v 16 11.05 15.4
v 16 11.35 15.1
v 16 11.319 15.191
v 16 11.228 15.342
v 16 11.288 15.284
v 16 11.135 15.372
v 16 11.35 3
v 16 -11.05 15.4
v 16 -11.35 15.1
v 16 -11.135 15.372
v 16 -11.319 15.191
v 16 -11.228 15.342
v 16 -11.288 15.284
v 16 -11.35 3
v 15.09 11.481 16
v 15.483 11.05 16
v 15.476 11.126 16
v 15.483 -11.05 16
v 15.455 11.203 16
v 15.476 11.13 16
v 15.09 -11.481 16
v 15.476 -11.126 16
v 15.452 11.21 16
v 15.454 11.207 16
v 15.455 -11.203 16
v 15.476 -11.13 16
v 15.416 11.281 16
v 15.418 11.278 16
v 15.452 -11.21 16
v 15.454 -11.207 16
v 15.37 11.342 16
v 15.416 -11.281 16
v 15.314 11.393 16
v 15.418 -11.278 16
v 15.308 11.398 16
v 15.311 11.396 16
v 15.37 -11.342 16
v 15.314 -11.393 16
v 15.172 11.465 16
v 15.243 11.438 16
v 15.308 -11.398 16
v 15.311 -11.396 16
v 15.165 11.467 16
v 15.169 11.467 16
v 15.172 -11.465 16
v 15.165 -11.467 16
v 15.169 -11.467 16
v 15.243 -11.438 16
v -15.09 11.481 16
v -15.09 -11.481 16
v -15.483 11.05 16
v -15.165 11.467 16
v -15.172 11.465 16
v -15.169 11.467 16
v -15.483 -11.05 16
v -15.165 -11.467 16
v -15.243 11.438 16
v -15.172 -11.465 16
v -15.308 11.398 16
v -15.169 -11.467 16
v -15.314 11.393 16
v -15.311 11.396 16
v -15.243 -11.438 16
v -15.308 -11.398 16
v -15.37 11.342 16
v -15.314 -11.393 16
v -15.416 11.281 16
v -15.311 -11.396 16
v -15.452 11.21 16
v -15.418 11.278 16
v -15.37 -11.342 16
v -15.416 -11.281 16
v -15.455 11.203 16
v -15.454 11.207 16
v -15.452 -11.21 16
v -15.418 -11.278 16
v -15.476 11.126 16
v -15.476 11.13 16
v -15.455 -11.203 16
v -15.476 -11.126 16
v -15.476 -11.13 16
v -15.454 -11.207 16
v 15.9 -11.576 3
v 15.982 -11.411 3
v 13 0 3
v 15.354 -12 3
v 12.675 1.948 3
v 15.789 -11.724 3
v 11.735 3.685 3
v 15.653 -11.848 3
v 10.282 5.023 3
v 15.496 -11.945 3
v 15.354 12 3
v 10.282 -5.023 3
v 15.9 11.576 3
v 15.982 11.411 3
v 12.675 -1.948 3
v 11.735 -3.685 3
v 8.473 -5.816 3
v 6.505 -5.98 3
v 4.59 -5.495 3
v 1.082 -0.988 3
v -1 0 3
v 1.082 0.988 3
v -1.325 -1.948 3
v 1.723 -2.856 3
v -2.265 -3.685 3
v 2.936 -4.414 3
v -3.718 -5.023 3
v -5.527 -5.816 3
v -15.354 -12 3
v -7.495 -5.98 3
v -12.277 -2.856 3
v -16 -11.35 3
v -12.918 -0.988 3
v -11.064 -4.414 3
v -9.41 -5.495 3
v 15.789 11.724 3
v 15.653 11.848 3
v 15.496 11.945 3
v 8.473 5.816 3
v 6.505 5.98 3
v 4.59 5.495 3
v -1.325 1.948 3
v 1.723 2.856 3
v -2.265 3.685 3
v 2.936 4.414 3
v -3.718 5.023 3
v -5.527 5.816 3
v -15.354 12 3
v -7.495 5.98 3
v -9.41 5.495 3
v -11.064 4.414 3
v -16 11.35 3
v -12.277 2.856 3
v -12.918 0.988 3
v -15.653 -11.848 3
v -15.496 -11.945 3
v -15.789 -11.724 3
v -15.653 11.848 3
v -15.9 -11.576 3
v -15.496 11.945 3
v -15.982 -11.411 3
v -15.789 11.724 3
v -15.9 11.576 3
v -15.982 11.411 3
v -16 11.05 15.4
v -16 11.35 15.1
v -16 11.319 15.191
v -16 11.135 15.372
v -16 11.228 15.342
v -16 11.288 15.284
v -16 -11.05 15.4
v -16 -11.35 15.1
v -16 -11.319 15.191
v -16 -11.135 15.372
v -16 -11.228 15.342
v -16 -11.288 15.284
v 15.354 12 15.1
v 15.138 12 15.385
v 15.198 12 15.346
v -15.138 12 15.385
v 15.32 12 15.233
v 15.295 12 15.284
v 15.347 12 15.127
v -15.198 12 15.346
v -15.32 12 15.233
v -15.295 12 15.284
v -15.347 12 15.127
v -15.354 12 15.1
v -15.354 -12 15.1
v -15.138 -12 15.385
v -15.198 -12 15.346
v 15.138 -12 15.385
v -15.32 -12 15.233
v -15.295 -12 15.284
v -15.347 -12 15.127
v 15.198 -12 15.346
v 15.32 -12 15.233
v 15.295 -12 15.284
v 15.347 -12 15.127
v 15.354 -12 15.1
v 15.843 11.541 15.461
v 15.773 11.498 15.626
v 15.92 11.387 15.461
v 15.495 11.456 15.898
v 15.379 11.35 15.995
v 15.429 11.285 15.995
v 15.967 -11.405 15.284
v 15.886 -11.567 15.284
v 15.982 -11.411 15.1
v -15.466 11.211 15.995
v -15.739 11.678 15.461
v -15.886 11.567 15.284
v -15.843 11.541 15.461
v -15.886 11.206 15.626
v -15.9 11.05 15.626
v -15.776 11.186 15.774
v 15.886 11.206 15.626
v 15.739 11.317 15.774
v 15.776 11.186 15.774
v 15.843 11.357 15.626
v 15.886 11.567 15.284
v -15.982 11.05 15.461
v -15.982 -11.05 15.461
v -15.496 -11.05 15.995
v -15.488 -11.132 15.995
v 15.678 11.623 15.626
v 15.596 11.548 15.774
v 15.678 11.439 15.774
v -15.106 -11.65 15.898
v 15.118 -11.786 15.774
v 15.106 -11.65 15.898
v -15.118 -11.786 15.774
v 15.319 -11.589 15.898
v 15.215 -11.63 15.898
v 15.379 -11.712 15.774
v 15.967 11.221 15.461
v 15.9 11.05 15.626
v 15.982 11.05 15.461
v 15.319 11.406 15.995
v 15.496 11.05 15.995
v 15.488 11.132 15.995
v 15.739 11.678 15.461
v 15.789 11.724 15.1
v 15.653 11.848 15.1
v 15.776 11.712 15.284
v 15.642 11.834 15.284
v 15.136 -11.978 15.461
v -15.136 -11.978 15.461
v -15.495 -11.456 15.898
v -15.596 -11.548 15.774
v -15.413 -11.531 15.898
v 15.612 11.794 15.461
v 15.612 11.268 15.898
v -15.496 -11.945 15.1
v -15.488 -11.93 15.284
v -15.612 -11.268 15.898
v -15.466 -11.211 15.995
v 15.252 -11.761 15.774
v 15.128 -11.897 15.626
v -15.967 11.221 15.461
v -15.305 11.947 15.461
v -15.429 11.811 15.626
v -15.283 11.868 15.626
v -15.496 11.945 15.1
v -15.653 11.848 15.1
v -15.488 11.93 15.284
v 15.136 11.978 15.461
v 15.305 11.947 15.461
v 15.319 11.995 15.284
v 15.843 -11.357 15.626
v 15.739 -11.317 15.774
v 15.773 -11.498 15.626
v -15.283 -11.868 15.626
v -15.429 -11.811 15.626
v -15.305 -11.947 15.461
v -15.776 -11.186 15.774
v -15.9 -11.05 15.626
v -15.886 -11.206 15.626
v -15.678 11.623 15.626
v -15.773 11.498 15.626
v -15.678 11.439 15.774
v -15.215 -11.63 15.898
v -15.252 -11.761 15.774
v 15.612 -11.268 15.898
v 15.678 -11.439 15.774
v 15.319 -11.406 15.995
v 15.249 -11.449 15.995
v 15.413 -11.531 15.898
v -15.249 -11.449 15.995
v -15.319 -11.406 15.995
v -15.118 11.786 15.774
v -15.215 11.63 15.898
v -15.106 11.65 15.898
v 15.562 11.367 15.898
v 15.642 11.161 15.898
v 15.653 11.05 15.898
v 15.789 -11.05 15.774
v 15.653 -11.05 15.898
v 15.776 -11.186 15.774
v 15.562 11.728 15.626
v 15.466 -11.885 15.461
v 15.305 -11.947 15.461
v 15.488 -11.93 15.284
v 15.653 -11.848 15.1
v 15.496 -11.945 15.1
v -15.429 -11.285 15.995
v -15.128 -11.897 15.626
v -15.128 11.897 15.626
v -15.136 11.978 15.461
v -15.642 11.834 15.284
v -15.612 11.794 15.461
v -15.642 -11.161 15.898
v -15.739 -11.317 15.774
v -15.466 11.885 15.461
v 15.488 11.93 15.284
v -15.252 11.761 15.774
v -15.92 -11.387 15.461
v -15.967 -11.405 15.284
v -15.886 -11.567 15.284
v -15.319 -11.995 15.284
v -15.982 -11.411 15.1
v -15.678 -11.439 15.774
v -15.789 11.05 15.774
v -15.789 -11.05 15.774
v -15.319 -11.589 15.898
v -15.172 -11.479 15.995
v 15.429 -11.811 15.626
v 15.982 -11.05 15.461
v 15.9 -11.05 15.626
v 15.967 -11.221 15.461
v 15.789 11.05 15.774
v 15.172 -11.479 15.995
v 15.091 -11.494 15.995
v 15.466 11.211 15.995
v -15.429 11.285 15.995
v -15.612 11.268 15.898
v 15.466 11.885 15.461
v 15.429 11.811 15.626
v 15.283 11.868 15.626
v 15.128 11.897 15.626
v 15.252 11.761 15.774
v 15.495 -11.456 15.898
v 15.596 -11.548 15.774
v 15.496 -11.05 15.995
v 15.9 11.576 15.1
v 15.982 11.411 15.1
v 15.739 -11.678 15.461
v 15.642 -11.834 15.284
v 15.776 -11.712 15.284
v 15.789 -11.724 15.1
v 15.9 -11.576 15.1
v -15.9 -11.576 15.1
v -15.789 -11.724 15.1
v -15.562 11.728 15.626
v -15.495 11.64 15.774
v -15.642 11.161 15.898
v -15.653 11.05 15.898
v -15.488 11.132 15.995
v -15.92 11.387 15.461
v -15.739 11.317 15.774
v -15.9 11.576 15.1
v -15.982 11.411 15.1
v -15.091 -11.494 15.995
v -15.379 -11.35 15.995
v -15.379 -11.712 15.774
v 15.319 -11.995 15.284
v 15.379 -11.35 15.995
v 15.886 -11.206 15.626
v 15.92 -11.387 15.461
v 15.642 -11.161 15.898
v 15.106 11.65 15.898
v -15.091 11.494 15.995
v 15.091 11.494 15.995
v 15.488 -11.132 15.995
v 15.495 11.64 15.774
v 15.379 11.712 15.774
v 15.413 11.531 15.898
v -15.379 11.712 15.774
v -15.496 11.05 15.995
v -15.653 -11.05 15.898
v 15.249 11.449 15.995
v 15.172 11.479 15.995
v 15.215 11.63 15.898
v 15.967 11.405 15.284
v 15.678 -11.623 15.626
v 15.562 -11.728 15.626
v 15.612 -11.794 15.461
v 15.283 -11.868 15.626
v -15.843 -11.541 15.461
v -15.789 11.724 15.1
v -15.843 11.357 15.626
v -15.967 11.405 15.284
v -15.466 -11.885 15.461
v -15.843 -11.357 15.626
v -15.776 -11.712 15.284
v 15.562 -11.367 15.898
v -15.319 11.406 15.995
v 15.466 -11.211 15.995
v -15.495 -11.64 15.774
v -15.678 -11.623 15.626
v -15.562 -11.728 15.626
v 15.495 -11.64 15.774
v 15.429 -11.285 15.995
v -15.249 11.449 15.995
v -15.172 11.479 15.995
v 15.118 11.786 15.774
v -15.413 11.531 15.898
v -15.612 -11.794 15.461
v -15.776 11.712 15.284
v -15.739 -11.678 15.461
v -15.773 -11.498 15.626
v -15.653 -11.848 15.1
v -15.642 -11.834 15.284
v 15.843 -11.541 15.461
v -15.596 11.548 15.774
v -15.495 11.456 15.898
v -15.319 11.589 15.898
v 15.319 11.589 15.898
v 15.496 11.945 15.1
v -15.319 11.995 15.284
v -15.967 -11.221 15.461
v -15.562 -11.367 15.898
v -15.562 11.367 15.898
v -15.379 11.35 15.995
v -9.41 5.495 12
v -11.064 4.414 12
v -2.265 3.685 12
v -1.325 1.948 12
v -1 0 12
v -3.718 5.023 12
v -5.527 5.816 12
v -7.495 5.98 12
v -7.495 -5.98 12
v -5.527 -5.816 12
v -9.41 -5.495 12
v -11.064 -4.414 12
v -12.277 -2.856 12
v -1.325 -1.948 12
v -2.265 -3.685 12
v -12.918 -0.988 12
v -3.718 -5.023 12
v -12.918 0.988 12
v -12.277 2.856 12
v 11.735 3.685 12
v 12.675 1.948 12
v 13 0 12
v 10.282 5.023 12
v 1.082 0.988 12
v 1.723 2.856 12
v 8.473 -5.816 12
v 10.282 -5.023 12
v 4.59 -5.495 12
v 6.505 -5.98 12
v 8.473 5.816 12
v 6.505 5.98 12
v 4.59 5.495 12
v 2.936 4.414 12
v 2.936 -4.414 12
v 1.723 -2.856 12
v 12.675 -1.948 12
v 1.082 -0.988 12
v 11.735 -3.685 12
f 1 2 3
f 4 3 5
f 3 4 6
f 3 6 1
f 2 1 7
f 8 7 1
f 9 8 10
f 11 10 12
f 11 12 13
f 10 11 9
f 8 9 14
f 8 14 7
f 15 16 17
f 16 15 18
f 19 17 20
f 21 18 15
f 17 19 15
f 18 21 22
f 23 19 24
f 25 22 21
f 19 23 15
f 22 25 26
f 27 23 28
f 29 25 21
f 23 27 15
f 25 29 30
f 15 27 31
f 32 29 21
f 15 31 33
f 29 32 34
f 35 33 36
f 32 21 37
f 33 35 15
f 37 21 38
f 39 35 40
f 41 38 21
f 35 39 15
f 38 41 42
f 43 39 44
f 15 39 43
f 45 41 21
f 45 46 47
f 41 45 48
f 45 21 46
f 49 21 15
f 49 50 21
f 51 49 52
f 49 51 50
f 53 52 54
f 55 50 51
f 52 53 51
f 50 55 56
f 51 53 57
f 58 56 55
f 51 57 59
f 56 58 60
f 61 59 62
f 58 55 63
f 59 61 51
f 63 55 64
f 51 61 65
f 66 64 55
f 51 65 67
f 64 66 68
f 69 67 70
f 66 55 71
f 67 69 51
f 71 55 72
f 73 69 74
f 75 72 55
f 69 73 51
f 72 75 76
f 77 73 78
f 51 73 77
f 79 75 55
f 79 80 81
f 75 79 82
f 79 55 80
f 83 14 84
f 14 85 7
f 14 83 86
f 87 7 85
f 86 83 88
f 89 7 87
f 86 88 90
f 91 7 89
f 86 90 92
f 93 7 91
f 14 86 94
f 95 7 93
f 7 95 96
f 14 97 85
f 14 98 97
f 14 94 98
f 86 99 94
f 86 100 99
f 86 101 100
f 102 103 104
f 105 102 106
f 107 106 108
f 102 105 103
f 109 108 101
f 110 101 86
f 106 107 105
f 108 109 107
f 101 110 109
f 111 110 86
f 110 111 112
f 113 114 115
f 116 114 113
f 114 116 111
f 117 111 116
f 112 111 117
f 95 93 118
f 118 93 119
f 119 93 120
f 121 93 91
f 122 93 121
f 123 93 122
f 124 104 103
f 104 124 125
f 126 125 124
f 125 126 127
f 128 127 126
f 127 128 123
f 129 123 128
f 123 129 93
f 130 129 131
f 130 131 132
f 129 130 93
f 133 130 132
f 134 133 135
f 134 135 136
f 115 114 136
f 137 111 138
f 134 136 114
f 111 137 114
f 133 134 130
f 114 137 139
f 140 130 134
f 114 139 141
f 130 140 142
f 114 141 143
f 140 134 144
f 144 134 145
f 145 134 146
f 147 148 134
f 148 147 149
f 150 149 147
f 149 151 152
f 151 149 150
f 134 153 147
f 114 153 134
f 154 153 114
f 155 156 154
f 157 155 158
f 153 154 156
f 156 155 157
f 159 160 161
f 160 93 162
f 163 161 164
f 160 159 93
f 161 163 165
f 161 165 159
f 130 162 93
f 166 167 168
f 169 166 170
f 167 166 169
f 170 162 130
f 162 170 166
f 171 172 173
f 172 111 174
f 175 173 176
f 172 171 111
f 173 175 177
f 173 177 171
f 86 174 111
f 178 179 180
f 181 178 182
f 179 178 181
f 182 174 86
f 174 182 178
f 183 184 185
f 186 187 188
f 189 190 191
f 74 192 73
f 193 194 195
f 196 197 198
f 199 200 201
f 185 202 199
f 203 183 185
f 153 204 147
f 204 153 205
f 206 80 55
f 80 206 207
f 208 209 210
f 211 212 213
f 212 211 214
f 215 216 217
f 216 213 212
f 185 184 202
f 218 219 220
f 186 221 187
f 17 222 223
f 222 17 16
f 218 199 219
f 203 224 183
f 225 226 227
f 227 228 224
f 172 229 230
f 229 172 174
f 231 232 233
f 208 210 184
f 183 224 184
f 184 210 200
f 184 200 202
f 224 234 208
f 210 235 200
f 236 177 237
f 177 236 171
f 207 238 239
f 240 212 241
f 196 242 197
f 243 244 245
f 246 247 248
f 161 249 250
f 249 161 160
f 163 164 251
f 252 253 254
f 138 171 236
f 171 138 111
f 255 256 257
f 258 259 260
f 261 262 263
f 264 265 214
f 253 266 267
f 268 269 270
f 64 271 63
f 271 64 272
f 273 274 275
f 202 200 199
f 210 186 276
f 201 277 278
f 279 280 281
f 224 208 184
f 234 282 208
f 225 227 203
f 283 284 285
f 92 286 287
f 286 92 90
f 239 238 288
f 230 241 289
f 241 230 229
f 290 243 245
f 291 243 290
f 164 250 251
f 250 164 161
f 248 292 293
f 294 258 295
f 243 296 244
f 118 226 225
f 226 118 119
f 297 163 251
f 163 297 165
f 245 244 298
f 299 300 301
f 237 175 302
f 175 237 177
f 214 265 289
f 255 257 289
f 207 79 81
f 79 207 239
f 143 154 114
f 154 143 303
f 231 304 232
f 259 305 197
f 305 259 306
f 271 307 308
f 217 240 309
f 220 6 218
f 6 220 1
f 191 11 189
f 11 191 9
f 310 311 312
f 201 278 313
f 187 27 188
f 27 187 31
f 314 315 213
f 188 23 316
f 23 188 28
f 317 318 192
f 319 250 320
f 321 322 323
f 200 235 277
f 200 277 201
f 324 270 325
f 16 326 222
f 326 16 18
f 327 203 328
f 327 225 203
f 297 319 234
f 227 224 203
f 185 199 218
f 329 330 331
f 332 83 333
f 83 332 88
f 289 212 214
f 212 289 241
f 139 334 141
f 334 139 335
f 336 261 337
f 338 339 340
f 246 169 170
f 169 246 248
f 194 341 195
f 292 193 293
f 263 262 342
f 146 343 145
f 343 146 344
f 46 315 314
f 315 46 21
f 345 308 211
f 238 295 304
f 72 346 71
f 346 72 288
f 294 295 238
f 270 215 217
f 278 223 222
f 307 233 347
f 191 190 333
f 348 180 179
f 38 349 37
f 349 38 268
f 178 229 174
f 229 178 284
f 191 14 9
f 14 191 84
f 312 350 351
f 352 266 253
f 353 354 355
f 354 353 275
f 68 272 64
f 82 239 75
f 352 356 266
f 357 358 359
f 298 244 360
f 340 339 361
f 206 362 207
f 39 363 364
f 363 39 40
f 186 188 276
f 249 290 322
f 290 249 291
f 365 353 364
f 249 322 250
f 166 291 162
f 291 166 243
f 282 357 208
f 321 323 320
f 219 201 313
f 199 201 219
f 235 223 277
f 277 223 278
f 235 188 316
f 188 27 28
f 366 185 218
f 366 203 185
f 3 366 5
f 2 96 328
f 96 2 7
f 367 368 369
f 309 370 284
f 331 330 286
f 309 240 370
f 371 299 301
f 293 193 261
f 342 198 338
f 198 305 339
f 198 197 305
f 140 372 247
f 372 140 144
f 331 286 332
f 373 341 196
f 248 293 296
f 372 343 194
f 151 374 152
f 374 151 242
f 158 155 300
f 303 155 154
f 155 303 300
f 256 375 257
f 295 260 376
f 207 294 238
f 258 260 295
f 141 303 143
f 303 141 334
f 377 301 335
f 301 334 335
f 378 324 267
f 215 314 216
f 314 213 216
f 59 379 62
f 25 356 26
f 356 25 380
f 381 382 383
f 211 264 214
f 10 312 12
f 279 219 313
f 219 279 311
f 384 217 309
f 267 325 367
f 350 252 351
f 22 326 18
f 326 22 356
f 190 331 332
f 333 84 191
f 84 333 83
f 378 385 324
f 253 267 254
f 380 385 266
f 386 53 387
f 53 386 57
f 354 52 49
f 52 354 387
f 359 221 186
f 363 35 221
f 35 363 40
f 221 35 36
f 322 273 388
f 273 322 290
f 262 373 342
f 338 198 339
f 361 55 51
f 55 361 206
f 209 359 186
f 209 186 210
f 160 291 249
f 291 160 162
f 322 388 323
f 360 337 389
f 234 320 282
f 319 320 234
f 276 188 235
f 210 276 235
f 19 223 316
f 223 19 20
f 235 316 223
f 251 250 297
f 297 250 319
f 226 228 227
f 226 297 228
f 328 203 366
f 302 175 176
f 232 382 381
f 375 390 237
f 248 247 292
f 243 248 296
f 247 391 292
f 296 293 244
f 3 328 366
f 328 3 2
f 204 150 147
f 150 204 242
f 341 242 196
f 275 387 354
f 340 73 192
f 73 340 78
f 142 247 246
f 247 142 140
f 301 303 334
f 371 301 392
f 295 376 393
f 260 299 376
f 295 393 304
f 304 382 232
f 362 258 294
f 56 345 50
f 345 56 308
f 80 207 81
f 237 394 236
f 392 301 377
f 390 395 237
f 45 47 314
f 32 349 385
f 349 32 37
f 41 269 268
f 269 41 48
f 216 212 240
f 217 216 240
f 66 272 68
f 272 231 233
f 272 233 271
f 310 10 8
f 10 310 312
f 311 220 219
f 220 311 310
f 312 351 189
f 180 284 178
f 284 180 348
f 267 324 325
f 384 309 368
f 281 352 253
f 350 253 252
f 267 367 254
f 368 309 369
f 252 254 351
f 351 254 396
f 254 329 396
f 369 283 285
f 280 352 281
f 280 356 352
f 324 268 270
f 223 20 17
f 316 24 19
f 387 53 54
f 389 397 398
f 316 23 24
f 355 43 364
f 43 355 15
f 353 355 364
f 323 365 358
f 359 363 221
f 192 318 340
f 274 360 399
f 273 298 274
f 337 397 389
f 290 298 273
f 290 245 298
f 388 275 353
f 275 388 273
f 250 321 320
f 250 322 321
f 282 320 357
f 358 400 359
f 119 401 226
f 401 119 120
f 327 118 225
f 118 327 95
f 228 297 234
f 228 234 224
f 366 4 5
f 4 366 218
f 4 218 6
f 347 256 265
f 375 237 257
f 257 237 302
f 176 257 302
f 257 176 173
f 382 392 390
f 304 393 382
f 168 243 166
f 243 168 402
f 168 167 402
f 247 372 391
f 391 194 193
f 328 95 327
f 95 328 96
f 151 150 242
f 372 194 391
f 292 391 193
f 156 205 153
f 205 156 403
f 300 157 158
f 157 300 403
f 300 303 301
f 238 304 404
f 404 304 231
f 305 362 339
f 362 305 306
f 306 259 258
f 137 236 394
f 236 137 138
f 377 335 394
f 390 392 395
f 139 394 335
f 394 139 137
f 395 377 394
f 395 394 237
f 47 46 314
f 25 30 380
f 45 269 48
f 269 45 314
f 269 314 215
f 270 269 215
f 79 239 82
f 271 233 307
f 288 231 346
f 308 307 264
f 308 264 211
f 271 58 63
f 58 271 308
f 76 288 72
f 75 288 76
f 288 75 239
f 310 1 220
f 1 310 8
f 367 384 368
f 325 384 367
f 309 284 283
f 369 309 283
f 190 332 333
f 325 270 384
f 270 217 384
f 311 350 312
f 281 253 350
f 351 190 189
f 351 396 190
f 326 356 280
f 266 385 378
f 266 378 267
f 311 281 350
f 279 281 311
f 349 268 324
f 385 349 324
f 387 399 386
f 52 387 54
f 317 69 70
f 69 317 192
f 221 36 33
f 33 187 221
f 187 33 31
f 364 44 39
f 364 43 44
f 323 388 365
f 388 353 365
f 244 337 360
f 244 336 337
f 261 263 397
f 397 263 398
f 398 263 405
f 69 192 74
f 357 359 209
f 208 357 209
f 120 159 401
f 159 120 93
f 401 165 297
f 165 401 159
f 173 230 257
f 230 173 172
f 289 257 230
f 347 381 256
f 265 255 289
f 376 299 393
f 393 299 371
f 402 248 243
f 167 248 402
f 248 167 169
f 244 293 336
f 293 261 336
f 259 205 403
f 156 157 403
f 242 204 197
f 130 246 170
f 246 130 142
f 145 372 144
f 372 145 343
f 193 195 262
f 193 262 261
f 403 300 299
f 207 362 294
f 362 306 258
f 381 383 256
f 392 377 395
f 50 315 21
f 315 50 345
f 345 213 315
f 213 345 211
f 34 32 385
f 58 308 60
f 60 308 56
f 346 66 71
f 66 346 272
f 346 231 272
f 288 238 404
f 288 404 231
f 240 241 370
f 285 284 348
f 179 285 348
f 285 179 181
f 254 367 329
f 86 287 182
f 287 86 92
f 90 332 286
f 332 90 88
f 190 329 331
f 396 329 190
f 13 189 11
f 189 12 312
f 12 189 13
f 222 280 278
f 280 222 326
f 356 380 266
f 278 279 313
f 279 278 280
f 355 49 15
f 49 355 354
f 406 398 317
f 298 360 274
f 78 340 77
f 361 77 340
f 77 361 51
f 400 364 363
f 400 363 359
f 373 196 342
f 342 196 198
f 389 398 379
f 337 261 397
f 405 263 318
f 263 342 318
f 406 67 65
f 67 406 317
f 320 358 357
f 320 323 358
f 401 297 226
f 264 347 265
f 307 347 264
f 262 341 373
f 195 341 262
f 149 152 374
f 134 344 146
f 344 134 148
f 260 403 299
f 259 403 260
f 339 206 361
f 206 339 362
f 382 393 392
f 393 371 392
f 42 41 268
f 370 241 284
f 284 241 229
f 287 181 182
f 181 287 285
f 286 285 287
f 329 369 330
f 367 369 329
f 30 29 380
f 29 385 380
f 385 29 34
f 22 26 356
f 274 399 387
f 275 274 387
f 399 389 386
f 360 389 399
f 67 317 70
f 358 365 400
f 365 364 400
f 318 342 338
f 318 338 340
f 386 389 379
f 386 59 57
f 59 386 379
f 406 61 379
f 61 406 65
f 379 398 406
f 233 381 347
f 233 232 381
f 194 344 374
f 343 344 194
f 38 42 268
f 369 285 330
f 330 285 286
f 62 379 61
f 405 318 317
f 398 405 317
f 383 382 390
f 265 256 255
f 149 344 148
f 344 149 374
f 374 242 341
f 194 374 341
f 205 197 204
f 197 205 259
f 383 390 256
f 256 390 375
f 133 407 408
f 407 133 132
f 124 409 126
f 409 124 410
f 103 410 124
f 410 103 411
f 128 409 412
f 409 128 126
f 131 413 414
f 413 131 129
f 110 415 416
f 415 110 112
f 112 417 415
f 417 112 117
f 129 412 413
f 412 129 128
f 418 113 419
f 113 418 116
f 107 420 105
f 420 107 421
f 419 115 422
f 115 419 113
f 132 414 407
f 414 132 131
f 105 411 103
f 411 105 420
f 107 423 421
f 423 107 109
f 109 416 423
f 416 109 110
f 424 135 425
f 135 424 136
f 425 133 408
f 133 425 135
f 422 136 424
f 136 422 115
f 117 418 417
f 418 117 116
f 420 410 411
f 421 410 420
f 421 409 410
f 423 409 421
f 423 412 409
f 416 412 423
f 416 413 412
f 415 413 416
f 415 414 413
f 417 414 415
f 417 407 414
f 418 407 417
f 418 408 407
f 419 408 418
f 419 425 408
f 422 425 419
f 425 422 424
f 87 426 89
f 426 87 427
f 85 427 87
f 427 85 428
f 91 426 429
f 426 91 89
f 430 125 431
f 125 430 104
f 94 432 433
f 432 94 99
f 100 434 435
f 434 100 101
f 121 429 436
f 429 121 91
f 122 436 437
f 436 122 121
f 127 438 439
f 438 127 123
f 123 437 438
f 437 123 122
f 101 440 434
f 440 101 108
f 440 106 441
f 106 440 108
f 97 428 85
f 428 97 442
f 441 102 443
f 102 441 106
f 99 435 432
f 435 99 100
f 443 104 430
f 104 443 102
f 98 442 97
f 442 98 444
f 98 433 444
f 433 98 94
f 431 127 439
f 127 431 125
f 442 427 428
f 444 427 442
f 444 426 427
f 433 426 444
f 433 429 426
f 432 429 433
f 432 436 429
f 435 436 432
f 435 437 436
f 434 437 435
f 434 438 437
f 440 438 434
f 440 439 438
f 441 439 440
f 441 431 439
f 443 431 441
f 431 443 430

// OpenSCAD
#color("white")
difference(){
    intersection(){
        union(){
            translate([0,0,9.5])
              cube([32,24,13],center=true);
        };
        hull(){
            $fn = 34;
            translate([-15.05,-11.05,.95]) sphere(r=1);
            translate([-15.05,11.05,.95]) sphere(r=1);
            translate([15.05,-11.05,.95]) sphere(r=1);
            translate([15.05,11.05,.95]) sphere(r=1);
            
            translate([-15.05,-11.05,15.1]) sphere(r=1);
            translate([-15.05,11.05,15.1]) sphere(r=1);
            translate([15.05,-11.05,15.1]) sphere(r=1);
            translate([15.05,11.05,15.1]) sphere(r=1);
        };
    };

    translate([0,0,16.1])
      rotate([180,0,90])
      resize([24,32,3])
      surface(file = "testtile.png", center = true, invert = false);
    translate([-7,0,3])
      cylinder(h=9,r=6);
    translate([7,0,3])
      cylinder(h=9,r=6);
};
